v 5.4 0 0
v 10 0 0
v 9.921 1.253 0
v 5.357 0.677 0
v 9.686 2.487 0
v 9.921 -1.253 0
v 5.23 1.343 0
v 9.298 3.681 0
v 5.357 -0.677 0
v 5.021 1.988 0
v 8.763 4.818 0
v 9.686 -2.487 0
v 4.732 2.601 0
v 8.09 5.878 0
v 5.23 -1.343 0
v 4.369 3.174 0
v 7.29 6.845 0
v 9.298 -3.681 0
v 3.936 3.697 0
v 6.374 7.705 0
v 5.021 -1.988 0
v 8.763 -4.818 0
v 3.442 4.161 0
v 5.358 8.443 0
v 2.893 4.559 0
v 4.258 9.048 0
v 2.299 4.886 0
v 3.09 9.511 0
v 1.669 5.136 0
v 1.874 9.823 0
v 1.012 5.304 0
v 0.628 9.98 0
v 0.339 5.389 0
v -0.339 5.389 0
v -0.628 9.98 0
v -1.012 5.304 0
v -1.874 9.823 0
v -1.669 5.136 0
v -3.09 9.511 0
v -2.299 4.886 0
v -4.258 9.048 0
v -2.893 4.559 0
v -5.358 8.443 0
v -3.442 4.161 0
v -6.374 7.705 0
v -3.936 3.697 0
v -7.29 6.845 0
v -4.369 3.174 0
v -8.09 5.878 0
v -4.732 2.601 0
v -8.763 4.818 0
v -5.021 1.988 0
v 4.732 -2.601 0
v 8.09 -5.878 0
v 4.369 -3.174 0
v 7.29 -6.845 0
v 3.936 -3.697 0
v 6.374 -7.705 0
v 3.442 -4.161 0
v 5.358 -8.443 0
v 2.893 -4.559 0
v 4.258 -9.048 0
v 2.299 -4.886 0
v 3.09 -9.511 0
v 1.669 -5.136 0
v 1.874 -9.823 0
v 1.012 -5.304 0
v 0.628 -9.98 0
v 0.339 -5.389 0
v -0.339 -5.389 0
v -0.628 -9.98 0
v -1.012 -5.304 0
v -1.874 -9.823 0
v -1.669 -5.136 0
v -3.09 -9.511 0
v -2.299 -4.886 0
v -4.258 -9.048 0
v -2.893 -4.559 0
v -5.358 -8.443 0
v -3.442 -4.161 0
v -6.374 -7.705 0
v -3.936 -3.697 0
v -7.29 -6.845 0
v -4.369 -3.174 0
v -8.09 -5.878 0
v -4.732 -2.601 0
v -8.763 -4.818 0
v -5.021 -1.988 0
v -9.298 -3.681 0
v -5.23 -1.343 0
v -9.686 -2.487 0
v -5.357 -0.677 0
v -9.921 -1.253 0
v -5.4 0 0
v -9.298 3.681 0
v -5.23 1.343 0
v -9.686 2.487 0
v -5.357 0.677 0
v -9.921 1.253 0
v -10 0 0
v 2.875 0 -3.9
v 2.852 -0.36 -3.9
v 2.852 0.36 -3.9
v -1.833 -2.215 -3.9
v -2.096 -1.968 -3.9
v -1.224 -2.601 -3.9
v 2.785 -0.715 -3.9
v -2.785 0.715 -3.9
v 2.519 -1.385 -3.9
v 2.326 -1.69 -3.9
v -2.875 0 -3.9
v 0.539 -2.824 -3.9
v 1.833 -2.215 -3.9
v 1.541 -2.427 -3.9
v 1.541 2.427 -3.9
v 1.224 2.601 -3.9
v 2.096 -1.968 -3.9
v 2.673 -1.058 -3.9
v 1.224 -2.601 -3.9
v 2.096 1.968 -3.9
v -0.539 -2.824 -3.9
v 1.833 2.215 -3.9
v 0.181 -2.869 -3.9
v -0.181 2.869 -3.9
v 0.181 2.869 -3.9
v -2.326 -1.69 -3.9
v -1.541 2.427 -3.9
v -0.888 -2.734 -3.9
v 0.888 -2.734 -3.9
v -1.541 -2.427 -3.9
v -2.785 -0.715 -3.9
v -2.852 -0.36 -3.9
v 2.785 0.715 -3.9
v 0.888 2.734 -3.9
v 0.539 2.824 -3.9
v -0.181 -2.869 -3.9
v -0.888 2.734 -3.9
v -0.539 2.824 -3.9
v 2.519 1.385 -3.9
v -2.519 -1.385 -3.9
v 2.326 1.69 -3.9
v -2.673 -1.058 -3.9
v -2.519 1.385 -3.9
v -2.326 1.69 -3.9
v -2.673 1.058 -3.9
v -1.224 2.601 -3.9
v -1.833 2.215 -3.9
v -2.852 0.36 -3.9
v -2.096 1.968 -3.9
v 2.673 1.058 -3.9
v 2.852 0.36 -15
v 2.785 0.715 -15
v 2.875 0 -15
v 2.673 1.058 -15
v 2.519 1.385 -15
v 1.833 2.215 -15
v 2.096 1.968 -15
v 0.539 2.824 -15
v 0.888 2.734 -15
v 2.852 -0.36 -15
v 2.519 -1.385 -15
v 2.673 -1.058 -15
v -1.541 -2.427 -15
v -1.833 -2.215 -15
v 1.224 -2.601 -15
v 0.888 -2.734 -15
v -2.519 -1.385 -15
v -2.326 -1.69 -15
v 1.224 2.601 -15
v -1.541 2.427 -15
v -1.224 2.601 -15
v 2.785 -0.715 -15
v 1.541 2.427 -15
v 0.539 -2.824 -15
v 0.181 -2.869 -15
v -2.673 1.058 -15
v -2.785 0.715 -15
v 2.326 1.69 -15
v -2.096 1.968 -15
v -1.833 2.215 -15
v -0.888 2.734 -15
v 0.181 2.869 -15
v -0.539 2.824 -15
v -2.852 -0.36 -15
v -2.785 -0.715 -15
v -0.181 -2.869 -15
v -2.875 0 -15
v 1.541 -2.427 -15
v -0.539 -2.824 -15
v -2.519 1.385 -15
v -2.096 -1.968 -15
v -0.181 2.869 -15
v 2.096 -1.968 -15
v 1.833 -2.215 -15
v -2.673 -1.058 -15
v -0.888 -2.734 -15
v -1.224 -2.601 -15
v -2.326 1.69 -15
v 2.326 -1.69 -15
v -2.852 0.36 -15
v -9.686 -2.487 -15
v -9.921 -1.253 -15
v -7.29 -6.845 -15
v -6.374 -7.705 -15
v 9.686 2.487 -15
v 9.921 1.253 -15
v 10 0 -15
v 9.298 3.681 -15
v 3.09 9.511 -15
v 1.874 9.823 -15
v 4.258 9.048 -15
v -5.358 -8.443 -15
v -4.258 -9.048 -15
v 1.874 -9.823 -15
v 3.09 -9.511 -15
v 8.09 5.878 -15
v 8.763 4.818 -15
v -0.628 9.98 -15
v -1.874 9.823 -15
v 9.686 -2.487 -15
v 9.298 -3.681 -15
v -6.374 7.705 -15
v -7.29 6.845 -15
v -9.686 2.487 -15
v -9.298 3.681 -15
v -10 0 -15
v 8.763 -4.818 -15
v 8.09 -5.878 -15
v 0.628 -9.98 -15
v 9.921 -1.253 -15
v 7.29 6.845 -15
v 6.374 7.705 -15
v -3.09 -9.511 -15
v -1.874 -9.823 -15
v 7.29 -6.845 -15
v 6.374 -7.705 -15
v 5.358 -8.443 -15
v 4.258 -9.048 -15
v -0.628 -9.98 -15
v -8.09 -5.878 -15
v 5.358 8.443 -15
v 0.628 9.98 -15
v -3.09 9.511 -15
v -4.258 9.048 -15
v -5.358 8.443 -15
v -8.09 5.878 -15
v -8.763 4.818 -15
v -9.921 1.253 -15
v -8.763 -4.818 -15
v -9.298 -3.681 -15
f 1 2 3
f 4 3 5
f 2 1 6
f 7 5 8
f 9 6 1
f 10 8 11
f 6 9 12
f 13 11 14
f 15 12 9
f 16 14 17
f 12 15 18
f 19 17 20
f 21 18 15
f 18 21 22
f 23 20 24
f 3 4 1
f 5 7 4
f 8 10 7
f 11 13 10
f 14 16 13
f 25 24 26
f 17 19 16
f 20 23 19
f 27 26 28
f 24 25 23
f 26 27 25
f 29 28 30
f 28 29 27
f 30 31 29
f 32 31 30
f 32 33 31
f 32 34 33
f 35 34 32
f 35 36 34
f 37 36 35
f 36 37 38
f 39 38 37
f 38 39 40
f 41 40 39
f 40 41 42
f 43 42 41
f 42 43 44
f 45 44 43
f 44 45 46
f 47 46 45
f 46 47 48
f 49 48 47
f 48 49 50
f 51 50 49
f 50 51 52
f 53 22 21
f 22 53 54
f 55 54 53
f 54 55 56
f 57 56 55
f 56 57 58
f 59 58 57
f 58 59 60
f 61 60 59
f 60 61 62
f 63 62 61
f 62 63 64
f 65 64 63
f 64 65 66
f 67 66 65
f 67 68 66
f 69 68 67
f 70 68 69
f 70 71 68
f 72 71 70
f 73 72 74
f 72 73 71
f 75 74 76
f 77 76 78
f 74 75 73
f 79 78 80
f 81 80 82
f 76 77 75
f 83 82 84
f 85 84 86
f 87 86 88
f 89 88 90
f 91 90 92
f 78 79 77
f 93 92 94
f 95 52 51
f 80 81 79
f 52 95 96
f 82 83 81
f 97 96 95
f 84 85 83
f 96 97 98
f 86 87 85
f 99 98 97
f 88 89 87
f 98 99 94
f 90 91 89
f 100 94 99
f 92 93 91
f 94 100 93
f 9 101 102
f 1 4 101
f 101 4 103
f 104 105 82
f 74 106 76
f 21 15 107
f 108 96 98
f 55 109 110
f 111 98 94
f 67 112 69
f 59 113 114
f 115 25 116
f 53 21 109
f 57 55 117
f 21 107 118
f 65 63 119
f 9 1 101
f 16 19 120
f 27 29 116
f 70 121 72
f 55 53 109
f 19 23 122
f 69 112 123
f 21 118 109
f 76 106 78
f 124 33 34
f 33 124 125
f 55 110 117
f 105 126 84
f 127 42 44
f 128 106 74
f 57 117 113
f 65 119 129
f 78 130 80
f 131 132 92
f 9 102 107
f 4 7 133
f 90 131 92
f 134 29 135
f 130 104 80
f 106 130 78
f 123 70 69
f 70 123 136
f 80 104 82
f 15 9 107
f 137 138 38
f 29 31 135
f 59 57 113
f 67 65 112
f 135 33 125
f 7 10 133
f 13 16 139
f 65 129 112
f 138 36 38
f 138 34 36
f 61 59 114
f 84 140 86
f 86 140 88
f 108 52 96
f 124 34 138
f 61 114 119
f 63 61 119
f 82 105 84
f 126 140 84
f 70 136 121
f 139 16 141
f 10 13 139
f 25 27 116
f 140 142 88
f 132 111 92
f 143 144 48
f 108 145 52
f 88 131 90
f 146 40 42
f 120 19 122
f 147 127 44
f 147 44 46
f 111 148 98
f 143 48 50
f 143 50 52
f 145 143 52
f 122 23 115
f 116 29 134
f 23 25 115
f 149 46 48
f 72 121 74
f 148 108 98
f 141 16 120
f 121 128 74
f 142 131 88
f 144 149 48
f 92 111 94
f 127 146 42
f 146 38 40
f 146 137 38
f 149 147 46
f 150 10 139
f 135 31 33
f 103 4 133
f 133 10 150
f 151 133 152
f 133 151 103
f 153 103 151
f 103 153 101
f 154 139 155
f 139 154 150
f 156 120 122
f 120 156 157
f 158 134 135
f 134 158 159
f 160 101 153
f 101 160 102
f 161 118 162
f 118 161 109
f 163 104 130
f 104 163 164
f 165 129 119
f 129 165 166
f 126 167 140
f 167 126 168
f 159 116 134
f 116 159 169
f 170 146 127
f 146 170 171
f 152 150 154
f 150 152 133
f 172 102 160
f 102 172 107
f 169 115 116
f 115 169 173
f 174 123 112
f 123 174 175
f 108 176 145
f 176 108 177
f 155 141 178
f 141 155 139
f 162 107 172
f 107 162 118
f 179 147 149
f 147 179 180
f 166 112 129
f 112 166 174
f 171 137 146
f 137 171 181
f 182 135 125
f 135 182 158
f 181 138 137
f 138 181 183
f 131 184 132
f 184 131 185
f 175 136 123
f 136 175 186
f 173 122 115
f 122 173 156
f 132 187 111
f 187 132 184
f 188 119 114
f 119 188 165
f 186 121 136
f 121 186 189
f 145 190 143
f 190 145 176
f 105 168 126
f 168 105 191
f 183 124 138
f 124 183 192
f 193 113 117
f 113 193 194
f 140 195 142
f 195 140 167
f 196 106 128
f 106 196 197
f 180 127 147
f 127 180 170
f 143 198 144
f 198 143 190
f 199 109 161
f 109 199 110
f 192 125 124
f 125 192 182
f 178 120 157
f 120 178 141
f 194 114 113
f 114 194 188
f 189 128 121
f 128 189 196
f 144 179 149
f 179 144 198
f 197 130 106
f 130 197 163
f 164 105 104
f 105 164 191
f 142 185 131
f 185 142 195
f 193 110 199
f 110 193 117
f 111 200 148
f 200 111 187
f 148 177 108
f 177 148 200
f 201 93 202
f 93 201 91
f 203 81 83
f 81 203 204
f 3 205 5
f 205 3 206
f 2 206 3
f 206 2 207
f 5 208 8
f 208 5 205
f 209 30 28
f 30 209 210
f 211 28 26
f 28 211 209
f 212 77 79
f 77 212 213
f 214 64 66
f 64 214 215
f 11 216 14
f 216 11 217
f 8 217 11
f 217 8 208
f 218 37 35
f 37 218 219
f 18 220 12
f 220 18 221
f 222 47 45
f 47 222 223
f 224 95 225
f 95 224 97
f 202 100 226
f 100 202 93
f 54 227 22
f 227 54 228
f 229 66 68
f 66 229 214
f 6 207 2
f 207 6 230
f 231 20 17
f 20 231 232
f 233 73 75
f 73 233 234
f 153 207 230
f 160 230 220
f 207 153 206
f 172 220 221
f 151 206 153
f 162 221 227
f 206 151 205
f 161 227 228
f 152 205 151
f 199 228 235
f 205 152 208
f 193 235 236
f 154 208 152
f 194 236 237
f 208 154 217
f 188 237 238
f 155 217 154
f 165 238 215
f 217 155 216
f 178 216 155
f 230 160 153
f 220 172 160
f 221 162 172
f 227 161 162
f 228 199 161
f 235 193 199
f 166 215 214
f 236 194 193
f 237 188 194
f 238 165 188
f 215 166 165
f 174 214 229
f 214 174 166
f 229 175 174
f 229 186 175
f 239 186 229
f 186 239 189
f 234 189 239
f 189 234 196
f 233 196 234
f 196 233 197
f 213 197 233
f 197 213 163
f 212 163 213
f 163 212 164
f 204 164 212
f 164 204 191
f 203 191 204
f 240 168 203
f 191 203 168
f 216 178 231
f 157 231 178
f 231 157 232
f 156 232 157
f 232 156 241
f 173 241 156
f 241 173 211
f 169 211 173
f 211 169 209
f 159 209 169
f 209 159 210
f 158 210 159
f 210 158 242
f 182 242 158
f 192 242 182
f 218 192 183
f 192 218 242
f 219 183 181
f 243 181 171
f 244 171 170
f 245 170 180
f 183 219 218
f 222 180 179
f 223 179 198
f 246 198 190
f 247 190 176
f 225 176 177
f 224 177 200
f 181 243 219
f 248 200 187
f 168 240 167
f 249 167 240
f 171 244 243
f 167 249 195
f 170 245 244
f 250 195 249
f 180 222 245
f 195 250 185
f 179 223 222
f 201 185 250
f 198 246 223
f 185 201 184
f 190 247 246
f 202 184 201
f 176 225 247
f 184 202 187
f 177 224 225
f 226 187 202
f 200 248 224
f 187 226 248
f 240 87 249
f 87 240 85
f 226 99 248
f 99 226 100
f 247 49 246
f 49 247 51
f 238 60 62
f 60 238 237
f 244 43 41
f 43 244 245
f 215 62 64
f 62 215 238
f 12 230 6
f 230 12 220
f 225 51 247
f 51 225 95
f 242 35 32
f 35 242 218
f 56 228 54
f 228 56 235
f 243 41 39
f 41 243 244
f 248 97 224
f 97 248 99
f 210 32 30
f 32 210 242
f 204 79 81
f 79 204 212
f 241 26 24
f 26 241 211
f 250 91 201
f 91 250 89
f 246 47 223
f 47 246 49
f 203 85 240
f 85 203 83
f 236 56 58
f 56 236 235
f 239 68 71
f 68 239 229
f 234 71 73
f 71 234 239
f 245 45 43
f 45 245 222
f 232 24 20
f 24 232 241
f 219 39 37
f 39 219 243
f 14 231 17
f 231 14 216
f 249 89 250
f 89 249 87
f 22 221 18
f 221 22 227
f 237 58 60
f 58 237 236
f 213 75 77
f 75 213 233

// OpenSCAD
$fn = 50;


difference() {
	union() {
		translate(v = [0, 0, -15.0000000000]) {
			cylinder(h = 15, r = 10.0000000000);
		}
	}
	union() {
		translate(v = [0, 0, 0]) {
			rotate(a = [0, 0, 0]) {
				difference() {
					union() {
						translate(v = [0, 0, -18.0000000000]) {
							cylinder(h = 18, r = 2.6000000000);
						}
						translate(v = [0, 0, -3.9000000000]) {
							cylinder(h = 3.9000000000, r1 = 2.8750000000, r2 = 5.4000000000);
						}
						translate(v = [0, 0, -18.0000000000]) {
							cylinder(h = 18, r = 2.8750000000);
						}
						translate(v = [0, 0, -18.0000000000]) {
							cylinder(h = 18, r = 2.6000000000);
						}
					}
					union();
				}
			}
		}
	}
}
